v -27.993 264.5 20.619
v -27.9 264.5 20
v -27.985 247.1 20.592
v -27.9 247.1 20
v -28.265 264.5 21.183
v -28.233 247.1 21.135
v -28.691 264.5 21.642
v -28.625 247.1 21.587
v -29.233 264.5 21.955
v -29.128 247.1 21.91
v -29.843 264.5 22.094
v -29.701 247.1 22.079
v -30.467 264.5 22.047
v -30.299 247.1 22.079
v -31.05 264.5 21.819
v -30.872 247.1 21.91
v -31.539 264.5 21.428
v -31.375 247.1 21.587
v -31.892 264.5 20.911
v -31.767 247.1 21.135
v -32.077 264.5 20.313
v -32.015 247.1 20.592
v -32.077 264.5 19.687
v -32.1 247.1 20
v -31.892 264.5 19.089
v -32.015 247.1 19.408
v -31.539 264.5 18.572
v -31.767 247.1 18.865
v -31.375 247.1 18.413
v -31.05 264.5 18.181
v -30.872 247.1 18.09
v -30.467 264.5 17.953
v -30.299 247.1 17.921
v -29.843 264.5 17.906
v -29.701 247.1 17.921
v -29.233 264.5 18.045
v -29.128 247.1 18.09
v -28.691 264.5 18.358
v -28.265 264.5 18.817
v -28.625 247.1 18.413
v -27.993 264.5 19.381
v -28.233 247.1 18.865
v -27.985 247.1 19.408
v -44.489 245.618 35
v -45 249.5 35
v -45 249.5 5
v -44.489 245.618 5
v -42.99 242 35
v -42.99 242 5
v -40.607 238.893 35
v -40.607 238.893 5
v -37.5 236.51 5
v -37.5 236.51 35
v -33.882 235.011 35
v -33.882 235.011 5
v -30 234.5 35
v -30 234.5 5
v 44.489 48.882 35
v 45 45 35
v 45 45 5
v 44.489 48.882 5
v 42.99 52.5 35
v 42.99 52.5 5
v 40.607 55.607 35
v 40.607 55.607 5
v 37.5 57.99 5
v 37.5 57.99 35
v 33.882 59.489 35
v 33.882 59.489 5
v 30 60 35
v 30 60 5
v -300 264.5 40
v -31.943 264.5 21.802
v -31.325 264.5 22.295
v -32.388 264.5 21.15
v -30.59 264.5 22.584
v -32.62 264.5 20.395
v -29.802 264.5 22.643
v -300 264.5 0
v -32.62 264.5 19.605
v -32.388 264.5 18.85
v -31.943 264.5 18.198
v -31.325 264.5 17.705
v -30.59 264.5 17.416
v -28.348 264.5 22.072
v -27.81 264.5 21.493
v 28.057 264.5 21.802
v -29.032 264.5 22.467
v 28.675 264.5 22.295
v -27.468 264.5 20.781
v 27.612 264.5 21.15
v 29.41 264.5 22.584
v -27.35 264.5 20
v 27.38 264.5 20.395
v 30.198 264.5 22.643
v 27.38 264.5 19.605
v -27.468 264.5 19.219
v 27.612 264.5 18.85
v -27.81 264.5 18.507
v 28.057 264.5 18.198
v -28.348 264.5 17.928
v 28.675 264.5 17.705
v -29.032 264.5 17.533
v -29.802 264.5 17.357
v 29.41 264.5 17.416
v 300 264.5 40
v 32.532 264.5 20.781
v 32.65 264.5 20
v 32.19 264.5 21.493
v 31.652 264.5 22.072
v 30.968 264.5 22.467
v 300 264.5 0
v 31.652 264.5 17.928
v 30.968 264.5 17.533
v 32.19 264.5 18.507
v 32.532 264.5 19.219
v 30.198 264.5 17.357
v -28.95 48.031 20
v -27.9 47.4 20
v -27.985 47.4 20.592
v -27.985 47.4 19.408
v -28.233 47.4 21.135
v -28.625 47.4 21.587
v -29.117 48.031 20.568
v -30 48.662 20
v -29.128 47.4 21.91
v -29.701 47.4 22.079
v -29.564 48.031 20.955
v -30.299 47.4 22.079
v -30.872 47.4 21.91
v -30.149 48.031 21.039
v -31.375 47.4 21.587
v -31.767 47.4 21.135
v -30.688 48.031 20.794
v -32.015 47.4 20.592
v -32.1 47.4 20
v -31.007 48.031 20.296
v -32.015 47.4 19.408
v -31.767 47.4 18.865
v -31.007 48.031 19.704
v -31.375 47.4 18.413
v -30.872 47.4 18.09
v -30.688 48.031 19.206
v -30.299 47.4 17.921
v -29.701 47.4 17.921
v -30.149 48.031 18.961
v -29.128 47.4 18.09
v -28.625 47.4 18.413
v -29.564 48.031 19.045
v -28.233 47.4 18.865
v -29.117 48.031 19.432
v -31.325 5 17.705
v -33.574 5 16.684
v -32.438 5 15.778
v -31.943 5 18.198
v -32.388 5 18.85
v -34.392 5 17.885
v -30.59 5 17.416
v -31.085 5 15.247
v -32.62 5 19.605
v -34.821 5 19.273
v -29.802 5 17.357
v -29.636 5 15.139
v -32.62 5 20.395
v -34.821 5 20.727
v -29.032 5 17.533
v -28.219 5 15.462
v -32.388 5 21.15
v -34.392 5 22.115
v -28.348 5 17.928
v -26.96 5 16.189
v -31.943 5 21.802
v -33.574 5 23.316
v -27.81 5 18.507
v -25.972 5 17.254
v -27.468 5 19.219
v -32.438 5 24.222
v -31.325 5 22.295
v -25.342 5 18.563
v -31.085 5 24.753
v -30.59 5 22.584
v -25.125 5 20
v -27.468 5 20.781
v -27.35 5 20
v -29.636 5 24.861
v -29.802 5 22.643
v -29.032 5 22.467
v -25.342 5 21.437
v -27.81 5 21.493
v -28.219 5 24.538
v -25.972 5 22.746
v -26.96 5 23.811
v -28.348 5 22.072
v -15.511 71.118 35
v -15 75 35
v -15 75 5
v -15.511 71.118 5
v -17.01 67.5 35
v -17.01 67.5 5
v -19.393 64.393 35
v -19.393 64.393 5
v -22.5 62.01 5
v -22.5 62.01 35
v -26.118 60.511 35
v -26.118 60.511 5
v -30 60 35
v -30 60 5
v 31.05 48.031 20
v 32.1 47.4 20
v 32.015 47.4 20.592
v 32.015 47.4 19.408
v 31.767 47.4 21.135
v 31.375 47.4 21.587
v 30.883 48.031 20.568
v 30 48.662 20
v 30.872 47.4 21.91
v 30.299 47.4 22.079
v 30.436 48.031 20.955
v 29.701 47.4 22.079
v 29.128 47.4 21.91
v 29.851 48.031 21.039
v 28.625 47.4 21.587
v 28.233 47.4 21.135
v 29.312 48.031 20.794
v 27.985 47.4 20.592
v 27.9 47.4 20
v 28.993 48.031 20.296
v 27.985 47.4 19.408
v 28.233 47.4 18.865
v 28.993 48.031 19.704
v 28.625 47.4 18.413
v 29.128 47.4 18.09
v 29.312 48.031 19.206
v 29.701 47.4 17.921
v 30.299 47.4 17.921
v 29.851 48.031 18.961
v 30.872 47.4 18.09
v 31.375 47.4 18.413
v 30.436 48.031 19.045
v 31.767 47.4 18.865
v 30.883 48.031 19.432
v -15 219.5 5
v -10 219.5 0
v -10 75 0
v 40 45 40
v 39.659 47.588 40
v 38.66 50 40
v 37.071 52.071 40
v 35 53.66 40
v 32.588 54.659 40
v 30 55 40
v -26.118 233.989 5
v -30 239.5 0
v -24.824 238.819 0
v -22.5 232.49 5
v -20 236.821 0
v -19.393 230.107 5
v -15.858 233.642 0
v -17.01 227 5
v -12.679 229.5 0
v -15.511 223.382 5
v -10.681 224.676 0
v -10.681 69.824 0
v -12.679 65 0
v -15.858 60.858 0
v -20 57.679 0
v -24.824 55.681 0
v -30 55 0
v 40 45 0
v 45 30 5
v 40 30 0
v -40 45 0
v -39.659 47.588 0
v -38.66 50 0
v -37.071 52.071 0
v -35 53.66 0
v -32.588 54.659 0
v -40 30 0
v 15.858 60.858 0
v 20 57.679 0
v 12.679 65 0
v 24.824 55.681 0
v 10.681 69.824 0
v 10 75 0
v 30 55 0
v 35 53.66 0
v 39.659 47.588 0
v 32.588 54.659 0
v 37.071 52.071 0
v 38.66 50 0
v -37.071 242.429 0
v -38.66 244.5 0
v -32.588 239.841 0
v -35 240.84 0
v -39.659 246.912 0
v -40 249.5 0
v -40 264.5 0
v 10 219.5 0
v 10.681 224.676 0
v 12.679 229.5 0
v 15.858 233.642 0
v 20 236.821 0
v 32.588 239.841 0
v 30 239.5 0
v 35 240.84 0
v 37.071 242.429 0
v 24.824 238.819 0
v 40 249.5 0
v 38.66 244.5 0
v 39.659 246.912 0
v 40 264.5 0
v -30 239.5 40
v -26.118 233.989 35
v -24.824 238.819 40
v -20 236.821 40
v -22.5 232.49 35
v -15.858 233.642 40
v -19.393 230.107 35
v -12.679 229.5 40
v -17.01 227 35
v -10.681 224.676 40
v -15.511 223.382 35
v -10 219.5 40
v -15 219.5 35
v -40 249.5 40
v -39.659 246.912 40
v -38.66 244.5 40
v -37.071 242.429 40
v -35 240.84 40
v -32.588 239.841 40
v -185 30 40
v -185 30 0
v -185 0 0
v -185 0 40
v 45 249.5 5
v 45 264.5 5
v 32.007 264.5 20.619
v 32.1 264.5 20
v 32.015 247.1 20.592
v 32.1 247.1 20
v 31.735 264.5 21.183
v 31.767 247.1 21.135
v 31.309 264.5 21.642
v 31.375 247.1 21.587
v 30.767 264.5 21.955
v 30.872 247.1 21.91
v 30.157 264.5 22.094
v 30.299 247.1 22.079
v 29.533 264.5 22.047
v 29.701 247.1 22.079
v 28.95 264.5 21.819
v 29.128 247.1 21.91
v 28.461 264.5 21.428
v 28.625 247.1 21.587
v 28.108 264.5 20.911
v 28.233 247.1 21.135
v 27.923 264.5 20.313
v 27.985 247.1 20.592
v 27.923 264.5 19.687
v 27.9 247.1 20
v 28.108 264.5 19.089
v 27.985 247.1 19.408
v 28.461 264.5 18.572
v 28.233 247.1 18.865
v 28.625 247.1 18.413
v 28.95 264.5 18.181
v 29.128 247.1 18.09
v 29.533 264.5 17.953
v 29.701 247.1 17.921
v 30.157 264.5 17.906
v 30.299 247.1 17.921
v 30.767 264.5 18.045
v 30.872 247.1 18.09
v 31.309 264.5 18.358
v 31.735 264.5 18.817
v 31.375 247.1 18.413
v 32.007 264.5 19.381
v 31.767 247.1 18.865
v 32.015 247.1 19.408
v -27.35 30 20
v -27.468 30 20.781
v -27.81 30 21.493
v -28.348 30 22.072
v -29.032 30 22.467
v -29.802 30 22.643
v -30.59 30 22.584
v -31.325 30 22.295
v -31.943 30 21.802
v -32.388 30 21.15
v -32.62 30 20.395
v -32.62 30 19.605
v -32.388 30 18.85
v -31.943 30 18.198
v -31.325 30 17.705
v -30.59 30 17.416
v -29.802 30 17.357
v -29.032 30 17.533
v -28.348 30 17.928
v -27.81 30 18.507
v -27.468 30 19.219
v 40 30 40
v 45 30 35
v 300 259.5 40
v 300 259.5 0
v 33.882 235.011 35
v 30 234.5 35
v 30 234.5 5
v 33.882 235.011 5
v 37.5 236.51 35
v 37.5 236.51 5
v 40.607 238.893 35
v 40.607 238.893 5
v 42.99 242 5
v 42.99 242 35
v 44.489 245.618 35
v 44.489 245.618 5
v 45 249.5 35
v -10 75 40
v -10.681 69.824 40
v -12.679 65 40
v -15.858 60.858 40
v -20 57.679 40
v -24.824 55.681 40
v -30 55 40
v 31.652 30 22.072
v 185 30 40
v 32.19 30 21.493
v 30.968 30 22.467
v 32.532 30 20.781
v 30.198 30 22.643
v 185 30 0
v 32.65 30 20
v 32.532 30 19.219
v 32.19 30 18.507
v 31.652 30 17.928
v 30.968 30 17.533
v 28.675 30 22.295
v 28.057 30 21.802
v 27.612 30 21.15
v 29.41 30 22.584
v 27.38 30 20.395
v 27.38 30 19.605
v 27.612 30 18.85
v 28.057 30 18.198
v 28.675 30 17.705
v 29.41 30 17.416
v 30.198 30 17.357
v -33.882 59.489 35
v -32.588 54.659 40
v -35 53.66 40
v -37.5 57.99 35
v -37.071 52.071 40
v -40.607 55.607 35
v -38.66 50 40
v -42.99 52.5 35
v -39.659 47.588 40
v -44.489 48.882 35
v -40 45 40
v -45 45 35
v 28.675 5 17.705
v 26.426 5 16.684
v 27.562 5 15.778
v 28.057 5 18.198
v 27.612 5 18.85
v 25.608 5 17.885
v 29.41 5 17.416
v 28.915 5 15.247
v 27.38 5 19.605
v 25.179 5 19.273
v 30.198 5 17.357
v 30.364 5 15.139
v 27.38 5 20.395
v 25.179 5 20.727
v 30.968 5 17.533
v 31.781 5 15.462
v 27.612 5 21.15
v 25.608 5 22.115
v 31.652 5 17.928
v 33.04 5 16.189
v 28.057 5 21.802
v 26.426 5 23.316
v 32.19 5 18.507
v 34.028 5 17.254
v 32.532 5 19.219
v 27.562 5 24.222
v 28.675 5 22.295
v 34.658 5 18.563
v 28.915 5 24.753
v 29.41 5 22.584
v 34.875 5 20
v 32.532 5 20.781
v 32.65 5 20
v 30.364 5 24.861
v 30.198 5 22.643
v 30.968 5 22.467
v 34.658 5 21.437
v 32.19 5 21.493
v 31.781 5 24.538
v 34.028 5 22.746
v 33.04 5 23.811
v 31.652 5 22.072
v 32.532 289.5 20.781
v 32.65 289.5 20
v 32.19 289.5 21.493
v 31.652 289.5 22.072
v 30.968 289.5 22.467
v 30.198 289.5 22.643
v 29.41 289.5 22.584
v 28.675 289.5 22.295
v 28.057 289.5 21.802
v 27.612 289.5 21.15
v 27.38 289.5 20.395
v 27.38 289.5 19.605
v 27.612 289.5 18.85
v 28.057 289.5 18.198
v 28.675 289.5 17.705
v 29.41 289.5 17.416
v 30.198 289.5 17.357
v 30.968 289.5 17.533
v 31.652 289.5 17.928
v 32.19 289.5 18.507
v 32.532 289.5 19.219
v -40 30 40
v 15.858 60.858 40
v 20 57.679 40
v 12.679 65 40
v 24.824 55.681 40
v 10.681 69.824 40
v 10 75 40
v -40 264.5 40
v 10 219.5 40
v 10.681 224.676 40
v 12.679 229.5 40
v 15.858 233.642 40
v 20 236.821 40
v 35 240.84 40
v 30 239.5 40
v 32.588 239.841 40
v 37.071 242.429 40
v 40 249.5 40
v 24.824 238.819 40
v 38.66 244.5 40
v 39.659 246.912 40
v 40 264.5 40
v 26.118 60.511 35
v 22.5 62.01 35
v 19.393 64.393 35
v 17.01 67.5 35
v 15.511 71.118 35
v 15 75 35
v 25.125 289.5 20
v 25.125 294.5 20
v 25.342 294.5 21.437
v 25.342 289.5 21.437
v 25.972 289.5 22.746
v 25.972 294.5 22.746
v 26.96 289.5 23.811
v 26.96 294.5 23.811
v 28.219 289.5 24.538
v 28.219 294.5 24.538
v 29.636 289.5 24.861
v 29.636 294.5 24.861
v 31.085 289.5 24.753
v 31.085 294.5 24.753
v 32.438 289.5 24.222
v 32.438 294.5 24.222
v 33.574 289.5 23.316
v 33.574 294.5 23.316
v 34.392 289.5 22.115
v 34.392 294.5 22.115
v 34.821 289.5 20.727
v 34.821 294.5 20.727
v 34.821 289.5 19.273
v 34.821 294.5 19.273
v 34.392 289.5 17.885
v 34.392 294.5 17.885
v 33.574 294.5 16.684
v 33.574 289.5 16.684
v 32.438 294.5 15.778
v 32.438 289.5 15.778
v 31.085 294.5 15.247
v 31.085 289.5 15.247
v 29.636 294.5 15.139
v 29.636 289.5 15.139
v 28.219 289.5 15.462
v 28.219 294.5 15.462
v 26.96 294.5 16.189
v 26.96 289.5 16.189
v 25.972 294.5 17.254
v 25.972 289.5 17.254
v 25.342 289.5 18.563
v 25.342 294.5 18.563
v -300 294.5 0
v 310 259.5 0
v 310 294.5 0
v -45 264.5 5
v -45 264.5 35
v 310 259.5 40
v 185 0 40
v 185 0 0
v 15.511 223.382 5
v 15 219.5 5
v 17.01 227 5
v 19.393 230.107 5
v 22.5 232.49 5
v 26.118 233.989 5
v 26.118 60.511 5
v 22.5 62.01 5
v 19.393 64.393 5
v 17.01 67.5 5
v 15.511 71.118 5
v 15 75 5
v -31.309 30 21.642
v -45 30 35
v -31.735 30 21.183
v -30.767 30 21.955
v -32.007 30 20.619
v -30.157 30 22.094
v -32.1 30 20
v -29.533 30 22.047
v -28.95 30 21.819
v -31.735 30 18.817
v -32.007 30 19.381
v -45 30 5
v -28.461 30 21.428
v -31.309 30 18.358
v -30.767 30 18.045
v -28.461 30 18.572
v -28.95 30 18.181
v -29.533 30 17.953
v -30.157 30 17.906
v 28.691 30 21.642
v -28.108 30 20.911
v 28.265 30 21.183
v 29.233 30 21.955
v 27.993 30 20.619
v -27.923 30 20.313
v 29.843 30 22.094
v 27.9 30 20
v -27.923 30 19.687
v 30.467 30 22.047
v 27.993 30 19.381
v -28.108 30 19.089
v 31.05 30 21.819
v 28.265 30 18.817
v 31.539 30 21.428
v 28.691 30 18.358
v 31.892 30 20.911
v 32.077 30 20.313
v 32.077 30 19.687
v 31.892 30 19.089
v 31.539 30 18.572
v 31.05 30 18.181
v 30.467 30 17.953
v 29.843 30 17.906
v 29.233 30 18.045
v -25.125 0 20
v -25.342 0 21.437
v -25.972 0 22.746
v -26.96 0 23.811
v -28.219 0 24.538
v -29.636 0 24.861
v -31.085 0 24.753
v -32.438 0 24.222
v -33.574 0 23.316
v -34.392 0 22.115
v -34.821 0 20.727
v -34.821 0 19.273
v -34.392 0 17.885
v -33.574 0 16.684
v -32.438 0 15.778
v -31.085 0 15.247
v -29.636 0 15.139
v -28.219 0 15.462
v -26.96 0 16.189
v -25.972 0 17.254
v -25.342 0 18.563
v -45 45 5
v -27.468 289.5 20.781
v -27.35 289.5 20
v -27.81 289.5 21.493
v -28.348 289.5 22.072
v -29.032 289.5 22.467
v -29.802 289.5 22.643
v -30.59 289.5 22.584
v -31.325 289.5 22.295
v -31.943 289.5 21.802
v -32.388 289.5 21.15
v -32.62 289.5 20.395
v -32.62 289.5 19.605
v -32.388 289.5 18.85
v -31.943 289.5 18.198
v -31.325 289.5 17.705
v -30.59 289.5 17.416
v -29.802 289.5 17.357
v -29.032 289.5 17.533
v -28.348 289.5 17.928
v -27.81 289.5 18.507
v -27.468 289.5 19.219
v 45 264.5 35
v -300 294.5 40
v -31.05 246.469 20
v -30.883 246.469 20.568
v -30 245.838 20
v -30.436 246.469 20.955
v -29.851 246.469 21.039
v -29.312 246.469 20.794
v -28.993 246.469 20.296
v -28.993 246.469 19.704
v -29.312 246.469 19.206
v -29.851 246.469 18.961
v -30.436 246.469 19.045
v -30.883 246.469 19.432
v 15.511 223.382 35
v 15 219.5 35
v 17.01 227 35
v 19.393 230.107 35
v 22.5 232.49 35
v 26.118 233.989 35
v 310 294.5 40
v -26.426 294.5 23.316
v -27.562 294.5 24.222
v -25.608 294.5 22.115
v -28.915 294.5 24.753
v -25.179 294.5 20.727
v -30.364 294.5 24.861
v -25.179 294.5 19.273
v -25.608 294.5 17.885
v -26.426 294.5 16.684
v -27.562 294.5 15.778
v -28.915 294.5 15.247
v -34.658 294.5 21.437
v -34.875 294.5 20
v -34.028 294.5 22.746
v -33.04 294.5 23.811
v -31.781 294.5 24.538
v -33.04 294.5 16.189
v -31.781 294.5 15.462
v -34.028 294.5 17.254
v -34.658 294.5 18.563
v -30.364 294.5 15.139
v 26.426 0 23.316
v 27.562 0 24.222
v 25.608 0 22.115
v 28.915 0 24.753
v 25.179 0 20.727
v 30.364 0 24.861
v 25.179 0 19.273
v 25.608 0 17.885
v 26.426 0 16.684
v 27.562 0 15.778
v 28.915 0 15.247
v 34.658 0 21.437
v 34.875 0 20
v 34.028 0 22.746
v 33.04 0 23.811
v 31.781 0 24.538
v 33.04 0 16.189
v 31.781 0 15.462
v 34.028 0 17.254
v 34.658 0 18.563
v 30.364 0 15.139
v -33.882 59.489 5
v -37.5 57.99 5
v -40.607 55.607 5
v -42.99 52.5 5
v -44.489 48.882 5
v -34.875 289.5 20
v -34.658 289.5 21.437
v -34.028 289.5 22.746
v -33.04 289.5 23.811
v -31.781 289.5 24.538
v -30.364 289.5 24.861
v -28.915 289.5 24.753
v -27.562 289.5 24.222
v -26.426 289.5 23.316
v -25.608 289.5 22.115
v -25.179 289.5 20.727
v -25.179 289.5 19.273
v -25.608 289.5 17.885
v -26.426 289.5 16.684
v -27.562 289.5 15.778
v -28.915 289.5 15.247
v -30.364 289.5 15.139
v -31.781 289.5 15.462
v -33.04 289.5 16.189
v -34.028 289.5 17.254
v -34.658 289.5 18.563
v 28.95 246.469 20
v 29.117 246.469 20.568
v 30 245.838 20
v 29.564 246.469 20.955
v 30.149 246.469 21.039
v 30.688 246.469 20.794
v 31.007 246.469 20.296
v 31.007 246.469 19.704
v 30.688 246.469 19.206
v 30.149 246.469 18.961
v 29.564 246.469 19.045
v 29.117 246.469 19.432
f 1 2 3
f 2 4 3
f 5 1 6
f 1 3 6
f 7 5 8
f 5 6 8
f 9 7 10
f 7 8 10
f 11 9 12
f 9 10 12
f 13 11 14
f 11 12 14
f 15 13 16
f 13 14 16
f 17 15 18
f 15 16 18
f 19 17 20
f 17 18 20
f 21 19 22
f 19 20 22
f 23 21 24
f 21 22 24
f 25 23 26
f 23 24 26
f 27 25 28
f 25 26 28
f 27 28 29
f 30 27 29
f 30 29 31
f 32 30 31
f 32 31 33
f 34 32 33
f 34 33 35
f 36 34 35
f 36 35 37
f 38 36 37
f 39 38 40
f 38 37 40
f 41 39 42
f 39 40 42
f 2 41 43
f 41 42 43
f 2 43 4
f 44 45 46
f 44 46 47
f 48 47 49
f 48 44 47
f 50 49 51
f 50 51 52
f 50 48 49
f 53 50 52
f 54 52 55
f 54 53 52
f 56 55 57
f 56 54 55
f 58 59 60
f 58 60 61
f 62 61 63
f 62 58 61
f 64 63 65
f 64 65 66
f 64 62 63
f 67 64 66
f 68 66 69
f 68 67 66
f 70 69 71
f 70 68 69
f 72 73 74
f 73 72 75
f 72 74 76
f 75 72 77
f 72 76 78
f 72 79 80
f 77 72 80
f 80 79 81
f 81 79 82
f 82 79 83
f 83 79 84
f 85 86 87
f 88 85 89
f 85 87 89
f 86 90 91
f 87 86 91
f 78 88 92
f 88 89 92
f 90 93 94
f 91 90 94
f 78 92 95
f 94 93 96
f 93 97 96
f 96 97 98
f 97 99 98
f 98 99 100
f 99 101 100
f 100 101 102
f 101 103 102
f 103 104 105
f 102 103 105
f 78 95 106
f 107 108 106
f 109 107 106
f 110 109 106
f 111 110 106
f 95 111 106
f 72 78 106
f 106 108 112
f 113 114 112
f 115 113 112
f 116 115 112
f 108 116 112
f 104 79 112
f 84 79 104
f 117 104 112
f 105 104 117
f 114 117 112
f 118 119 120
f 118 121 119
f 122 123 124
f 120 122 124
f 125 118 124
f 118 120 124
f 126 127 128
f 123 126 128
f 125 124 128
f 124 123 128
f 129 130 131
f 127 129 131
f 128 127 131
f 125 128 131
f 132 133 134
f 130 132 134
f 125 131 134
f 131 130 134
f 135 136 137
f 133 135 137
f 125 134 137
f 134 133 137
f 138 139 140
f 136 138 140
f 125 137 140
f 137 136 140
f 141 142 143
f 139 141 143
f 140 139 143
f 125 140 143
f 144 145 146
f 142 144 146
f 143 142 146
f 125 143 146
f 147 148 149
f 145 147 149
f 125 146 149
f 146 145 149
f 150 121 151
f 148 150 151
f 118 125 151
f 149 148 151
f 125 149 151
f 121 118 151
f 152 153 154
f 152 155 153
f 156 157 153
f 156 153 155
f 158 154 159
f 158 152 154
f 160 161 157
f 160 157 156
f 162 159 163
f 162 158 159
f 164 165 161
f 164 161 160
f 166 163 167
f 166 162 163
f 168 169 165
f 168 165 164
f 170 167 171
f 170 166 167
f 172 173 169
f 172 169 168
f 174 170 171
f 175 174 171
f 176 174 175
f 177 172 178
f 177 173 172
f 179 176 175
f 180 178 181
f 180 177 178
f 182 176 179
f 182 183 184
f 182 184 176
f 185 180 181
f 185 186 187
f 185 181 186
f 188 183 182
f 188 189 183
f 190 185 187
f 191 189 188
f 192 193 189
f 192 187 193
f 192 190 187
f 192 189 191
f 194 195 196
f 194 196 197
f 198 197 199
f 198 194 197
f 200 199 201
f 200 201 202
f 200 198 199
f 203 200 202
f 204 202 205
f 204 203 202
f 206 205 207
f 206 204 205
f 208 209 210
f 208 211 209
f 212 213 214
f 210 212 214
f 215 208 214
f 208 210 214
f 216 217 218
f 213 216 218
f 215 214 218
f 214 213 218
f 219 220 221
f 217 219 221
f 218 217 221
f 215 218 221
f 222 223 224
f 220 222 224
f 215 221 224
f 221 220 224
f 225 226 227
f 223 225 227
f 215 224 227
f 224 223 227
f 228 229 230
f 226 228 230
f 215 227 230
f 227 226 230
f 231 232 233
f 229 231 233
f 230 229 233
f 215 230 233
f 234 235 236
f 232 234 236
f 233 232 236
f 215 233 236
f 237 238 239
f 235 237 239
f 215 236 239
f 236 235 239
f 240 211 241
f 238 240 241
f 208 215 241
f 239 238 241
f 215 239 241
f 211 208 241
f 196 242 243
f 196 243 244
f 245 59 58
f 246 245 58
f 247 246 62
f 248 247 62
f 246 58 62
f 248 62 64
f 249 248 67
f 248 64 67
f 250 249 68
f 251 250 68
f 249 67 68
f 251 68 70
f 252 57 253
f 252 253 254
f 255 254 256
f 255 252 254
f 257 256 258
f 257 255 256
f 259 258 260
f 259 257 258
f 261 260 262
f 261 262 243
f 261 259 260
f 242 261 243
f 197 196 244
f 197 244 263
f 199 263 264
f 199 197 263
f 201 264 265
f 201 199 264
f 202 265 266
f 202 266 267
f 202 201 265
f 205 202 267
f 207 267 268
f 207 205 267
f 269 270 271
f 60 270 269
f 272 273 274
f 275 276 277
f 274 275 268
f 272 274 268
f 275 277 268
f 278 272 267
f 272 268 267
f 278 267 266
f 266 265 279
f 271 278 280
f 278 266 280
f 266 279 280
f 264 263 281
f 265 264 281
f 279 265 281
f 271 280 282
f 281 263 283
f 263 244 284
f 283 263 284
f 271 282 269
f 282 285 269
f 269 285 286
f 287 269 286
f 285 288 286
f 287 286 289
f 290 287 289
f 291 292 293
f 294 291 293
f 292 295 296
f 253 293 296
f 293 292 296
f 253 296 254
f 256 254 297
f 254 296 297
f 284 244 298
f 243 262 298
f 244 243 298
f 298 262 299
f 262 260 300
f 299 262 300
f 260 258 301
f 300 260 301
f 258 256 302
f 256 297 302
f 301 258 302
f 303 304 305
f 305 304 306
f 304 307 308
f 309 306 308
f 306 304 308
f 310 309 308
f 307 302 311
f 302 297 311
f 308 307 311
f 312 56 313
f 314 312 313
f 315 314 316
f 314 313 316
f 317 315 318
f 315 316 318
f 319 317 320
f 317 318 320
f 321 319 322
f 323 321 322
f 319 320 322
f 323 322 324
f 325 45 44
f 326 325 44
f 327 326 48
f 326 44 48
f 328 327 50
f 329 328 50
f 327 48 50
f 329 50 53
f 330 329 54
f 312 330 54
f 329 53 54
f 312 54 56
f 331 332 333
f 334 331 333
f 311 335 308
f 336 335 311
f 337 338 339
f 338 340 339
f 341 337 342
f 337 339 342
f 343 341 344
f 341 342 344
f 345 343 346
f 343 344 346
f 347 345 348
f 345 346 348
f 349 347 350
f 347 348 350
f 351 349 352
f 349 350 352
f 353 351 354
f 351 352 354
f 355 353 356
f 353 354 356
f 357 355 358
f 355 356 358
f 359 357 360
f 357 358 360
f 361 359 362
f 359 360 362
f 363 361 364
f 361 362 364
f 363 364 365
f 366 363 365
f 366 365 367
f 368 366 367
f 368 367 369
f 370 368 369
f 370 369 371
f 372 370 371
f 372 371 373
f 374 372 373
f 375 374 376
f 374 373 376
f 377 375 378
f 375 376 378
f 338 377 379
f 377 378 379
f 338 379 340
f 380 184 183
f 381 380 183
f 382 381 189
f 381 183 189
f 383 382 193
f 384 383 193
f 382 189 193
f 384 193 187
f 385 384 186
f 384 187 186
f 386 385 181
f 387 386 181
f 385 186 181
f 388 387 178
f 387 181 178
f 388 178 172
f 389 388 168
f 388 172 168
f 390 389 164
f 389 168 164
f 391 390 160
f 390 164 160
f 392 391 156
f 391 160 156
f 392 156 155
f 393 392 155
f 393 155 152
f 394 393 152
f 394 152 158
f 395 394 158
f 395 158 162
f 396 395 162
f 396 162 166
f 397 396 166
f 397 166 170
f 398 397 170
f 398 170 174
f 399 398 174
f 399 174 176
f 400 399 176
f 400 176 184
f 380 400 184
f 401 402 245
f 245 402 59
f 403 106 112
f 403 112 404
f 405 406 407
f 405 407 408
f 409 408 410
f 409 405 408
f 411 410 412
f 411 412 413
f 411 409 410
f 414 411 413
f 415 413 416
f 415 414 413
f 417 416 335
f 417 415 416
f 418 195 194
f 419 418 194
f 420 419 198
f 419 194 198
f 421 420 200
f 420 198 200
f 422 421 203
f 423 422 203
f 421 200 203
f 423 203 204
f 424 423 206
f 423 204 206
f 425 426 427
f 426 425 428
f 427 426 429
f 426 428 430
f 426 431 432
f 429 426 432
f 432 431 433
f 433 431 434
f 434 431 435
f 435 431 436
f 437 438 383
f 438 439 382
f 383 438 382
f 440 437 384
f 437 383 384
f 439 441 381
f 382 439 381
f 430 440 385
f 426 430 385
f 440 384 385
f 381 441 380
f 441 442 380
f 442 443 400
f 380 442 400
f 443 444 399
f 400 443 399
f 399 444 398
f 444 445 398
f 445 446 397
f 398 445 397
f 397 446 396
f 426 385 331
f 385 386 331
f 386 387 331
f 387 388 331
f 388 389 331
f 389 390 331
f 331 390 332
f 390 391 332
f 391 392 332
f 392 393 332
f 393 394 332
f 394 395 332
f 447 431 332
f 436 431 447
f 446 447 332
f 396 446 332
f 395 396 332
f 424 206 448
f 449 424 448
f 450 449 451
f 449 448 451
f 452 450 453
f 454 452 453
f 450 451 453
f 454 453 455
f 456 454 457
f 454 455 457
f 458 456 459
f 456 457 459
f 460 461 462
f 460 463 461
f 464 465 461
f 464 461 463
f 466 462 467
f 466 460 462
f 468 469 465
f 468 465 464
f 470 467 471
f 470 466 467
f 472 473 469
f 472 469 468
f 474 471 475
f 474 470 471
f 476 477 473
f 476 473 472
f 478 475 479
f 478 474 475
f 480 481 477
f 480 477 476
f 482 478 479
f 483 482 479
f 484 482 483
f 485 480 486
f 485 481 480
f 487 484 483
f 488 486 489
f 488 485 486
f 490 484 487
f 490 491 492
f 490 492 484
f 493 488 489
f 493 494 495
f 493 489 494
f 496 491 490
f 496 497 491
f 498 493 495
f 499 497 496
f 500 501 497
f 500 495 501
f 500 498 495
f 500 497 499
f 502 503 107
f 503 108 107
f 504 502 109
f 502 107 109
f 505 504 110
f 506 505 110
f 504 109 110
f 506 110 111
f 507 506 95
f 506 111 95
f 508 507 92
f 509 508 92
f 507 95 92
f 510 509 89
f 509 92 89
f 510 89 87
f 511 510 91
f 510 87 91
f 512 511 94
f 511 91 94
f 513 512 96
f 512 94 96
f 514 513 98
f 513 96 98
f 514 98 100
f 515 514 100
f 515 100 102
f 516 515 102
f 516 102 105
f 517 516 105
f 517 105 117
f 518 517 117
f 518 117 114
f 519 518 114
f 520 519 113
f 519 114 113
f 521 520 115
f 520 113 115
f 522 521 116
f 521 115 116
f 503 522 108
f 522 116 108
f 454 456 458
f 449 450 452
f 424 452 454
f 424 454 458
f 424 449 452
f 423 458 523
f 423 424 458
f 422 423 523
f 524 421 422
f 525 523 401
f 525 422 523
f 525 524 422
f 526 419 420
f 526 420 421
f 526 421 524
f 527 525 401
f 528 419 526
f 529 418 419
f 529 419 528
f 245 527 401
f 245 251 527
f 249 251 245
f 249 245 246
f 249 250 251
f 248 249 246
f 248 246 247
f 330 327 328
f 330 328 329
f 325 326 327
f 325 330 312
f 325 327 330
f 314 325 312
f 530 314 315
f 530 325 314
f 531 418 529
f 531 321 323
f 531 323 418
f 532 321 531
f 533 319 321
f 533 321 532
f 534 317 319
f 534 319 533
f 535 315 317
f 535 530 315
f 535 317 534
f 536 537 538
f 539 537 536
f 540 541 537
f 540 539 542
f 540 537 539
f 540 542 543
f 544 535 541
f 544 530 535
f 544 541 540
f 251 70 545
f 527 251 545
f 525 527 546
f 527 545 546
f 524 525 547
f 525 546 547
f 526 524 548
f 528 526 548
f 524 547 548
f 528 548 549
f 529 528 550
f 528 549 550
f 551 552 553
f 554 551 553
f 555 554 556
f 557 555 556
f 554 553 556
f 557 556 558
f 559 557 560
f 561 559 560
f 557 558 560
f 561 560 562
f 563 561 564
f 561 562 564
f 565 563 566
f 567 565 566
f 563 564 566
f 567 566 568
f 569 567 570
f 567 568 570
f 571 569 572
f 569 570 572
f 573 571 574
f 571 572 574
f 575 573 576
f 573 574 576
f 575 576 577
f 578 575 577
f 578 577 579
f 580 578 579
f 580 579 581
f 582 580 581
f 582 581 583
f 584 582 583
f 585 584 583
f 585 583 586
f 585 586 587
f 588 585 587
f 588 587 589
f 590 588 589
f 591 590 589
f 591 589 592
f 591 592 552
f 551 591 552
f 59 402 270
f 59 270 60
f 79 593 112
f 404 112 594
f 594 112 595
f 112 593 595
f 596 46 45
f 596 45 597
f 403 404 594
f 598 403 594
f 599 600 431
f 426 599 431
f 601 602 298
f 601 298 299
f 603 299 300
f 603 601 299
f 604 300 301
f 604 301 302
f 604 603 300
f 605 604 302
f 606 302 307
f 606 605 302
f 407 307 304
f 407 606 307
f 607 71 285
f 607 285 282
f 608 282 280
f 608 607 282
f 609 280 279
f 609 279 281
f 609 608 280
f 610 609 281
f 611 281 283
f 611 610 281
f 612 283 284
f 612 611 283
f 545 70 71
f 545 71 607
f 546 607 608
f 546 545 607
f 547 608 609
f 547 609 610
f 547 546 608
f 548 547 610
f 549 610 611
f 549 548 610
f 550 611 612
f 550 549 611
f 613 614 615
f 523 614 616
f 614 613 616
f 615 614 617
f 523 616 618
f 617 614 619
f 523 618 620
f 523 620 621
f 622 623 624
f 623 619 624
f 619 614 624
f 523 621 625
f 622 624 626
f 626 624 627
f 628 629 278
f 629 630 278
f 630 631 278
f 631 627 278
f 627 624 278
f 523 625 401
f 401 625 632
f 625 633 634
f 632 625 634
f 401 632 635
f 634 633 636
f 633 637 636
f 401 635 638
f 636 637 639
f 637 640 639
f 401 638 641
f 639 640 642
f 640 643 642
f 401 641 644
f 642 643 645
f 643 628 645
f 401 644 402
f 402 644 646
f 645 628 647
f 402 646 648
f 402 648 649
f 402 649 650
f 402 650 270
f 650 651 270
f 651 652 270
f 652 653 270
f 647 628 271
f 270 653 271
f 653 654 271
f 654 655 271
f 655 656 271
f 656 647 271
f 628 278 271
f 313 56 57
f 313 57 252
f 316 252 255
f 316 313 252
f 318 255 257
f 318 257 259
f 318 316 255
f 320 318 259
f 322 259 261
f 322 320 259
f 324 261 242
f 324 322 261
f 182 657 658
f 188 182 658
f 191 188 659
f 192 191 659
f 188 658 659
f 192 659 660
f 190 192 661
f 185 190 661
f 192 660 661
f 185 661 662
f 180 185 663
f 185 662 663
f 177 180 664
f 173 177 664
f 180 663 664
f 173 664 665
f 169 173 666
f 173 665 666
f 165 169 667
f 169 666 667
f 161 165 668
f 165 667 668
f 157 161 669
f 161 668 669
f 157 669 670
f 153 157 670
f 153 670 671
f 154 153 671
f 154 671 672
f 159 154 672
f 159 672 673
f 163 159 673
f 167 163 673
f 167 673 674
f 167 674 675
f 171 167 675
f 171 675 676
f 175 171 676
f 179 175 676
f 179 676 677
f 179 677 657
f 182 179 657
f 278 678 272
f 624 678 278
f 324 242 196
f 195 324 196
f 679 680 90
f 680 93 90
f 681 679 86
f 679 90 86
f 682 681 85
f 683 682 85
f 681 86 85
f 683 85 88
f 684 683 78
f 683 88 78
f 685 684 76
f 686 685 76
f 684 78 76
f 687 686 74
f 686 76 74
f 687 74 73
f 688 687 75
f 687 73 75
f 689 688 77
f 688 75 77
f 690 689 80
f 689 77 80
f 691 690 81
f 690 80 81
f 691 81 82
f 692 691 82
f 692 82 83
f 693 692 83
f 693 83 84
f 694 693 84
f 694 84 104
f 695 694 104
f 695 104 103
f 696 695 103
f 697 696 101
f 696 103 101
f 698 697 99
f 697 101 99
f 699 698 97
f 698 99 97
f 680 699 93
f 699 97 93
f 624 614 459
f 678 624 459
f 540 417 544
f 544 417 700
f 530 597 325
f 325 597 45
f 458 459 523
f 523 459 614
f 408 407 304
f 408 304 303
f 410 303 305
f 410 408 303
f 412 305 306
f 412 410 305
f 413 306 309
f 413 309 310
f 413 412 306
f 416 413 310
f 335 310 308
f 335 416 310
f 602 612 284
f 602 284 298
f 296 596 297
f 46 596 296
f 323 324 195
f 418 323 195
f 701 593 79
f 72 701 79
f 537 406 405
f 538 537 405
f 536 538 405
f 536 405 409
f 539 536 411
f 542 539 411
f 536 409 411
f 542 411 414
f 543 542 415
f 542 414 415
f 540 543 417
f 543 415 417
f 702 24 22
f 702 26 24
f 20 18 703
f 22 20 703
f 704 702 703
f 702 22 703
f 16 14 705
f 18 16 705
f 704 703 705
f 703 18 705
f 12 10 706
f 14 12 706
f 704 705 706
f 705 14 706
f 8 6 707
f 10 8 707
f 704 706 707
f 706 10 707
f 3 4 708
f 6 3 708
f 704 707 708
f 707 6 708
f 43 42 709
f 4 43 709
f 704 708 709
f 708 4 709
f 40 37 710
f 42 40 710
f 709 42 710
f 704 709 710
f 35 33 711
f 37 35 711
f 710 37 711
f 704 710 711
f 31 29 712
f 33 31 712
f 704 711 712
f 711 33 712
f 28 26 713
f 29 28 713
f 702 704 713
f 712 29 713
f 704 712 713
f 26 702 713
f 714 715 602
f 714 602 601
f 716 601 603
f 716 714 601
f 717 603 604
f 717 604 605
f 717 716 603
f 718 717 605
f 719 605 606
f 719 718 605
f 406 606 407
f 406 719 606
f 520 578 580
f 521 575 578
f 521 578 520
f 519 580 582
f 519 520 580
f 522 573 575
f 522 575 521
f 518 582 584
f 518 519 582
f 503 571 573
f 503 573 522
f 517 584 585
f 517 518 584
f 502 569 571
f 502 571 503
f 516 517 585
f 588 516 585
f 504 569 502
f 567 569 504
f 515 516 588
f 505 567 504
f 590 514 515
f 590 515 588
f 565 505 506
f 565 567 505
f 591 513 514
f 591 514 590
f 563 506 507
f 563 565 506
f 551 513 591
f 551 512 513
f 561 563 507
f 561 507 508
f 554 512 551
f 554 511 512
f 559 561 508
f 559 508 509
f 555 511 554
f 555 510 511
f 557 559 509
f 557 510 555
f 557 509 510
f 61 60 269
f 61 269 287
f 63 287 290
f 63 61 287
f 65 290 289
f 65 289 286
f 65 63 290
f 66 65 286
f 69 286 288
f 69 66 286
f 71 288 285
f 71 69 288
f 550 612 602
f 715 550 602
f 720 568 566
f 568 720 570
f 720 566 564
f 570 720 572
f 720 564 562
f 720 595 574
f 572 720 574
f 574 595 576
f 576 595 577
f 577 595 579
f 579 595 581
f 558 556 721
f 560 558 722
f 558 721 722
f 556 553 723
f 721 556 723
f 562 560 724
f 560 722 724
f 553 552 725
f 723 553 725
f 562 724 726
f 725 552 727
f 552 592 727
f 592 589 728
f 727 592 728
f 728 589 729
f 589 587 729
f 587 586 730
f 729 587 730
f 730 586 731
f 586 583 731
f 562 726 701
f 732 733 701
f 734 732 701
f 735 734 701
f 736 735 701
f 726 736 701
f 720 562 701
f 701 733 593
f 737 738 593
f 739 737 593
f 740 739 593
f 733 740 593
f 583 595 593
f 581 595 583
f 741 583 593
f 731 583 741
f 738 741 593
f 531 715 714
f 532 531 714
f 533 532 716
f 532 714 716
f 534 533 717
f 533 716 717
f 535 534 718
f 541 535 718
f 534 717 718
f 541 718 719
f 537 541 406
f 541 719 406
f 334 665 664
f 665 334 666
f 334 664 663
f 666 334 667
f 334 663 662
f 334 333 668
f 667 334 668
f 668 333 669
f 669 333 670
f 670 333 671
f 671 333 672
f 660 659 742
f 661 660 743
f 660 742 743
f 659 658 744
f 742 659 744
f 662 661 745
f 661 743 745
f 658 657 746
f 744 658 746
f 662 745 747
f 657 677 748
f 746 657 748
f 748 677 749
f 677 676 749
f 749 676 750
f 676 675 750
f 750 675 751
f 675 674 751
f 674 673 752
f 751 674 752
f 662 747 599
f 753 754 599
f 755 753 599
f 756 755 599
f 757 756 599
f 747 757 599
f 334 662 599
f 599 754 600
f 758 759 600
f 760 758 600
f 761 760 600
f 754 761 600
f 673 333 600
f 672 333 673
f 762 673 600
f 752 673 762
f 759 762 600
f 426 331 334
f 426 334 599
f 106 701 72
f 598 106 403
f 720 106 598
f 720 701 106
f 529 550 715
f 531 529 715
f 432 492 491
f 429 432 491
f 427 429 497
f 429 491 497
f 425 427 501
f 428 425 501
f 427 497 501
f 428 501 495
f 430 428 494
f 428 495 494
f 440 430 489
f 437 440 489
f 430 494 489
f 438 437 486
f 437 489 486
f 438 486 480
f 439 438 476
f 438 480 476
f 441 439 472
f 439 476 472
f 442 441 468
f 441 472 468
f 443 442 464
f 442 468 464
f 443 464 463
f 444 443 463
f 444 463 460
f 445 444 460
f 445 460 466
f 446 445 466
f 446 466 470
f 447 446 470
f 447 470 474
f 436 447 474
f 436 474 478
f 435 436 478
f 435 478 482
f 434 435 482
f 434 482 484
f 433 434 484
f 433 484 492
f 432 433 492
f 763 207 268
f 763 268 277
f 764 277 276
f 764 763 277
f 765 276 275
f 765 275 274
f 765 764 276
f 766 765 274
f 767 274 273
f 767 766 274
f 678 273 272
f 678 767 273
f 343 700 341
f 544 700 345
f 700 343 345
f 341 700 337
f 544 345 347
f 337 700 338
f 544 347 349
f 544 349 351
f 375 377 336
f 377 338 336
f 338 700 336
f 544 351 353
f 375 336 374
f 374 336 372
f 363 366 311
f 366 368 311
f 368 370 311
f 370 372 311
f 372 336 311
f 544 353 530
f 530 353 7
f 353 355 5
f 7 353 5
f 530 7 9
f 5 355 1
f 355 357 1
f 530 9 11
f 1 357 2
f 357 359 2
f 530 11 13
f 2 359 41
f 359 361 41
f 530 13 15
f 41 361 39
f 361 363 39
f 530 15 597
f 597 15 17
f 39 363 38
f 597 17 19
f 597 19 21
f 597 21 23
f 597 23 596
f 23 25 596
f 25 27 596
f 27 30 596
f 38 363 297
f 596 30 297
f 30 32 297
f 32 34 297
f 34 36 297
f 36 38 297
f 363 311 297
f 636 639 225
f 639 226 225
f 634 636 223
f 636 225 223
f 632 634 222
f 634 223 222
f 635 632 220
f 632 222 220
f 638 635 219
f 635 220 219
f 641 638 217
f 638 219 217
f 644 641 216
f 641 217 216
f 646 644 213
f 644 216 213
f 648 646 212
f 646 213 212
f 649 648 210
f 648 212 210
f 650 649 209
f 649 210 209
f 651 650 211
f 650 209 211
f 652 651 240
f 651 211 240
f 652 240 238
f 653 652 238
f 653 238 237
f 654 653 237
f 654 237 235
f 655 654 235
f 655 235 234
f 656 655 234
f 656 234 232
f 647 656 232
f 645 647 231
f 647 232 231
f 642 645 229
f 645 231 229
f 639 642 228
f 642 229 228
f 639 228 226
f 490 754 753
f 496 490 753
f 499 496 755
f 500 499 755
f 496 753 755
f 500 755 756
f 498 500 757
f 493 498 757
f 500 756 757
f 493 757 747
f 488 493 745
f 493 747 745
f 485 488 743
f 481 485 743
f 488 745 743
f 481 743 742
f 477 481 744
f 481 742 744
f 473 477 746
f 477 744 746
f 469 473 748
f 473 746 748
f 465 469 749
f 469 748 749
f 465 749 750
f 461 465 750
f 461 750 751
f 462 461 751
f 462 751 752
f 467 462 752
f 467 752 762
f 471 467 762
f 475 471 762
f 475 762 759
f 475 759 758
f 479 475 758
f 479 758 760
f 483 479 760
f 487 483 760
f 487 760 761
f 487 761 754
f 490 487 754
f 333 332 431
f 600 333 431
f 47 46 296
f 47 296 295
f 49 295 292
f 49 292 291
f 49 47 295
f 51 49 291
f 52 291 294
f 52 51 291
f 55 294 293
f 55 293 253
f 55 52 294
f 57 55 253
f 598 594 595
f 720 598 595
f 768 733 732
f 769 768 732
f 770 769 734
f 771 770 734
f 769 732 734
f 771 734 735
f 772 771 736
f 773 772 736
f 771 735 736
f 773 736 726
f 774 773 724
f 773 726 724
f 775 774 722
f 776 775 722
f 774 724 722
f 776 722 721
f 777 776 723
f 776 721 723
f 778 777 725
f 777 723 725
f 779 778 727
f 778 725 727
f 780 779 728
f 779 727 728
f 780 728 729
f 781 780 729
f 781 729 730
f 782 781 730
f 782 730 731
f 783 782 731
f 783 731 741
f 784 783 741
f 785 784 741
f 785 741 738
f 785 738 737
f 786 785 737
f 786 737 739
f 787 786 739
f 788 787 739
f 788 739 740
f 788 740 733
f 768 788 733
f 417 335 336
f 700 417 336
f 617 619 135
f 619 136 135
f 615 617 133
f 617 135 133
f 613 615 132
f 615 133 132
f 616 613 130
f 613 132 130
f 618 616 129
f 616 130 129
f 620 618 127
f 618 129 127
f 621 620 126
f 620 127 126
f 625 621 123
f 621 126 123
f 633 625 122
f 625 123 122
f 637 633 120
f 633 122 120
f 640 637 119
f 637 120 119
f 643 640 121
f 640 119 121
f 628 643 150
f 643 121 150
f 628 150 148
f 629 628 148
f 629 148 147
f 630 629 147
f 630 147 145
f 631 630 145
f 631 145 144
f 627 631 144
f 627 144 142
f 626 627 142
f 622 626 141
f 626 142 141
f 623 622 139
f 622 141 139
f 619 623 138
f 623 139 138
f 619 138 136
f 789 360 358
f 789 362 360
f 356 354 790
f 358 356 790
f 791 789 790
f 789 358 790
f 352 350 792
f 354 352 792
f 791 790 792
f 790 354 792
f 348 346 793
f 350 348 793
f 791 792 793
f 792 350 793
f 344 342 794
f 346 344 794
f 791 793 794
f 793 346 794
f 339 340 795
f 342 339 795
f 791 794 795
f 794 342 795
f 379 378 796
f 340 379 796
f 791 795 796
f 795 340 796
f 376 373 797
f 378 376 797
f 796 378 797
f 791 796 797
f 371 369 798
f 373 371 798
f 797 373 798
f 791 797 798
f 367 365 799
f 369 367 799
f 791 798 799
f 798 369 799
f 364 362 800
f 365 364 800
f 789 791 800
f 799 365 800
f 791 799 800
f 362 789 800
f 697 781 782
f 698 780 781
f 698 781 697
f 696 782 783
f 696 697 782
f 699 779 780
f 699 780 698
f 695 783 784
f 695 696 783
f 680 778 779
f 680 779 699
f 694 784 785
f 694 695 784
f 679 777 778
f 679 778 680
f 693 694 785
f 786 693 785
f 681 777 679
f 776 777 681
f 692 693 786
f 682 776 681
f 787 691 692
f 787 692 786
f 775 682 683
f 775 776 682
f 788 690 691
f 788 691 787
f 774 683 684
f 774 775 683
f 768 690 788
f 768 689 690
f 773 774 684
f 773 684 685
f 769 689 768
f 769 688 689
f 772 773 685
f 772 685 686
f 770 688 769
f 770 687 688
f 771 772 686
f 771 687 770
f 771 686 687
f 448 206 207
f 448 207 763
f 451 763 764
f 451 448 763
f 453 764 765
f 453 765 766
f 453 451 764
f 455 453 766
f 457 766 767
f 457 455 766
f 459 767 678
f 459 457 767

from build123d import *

# Parameters (mm, degrees)
F1_DEPTH             = 40
F0_W                 = 30
F0_H                 = 30
F2_DEPTH             = 40
F3_DEPTH             = 40
F4_R                 = 14.99999
F5_SIZE              = 5
F8_D                 = 5.3
F8_CBORE_D           = 9.75
F8_CBORE_DEPTH       = 5
F8_2_D               = 5.3
F8_2_CBORE_D         = 9.75
F8_2_CBORE_DEPTH     = 5
F8_ON_F7_D           = 5.3
F8_ON_F7_CBORE_D     = 9.75
F8_ON_F7_CBORE_DEPTH = 5
F9_D                 = 4.2
F9_DEPTH             = 17.4
F9_START             = 30
F9_TIP               = 1.2618073
F9_ON_F7_D           = 4.2
F9_ON_F7_DEPTH       = 17.4
F9_ON_F7_START       = 30
F9_ON_F7_TIP         = 1.2618073


# Not quite as in the source:
# - a fillet or chamfer is up to 0.001 mm smaller than in the source, because OpenCascade refuses the exact size


with BuildPart() as f1:
    # F0 (on Top) → F1 (new body)
    with BuildSketch(Plane.XY):
        Polygon((300, 294.5), (-300, 294.5), (-300, 264.5), (-45, 264.5), (-15, 264.5), (15, 264.5), (45, 264.5), (300, 264.5), align=None)
        Polygon((310, 294.5), (300, 294.5), (300, 264.5), (300, 259.5), (310, 259.5), align=None)
    extrude(amount=F1_DEPTH)

    # F8 (through all)
    with Locations(Plane(origin=(0, 294.5, 0), x_dir=(-1, 0, 0), z_dir=(0, 1, 0))):
        with Locations((-30, 20), (30, 20)):
            CounterBoreHole(F8_D / 2, F8_CBORE_D / 2, F8_CBORE_DEPTH)


with BuildPart() as f2:
    # F0 (on Top) → F2 (new body)
    with BuildSketch(Plane.XY):
        Polygon((15, 264.5), (-15, 264.5), (-15, 234.5), (-15, 60), (-15, 30), (15, 30), (15, 60), (15, 234.5), align=None)
        with Locations((-30, 249.5)):
            Rectangle(F0_W, F0_H)
        with Locations((30, 249.5)):
            Rectangle(F0_W, F0_H)
        with Locations((-30, 45)):
            Rectangle(F0_W, F0_H)
        with Locations((30, 45)):
            Rectangle(F0_W, F0_H)
    extrude(amount=F2_DEPTH)

    # F4 (radius 15 in the source; OpenCascade refuses exactly that, so slightly less here)
    f4_edges = [f2.edges().sort_by_distance(p)[0] for p in [
        (45, 234.5, 20),
        (-45, 234.5, 20),
        (-45, 60, 20),
        (45, 60, 20),
        (15, 234.5, 20),
        (-15, 234.5, 20),
        (-15, 60, 20),
        (15, 60, 20),
    ]]
    fillet(f4_edges, radius=F4_R)

    # F5
    f5_edges = [f2.edges().sort_by_distance(p)[0] for p in [
        (-15, 147.25, 40),
        (15, 147.25, 40),
        (-15, 147.25, 0),
        (15, 147.25, 0),
    ]]
    chamfer(f5_edges, length=F5_SIZE)

    # F9
    # its depths count from where the whole tool has entered the part; down to there all is cleared
    with Locations(Plane(origin=(0, 294.5, 0), x_dir=(-1, 0, 0), z_dir=(0, 1, 0))):
        with Locations((30, 20), (-30, 20)):
            Hole(F9_D / 2, depth=F9_START)
    with Locations(Plane(origin=(0, 294.5, 0), x_dir=(-1, 0, 0), z_dir=(0, 1, 0)).offset(-F9_START)):
        with Locations((30, 20), (-30, 20)):
            Hole(F9_D / 2, depth=F9_DEPTH)
            with Locations((0, 0, -(F9_DEPTH + F9_TIP / 2))):  # 118° drill point
                Cone(0, F9_D / 2, F9_TIP, mode=Mode.SUBTRACT)

    # F9 on F7
    # its depths count from where the whole tool has entered the part; down to there all is cleared
    with Locations(Plane.XZ):
        with Locations((-30, 20), (30, 20)):
            Hole(F9_ON_F7_D / 2, depth=F9_ON_F7_START)
    with Locations(Plane.XZ.offset(-F9_ON_F7_START)):
        with Locations((-30, 20), (30, 20)):
            Hole(F9_ON_F7_D / 2, depth=F9_ON_F7_DEPTH)
            with Locations((0, 0, -(F9_ON_F7_DEPTH + F9_ON_F7_TIP / 2))):  # 118° drill point
                Cone(0, F9_ON_F7_D / 2, F9_ON_F7_TIP, mode=Mode.SUBTRACT)


with BuildPart() as f3:
    # F0 (on Top) → F3 (new body)
    with BuildSketch(Plane.XY):
        Polygon((15, 30), (-15, 30), (-45, 30), (-185, 30), (-185, 0), (185, 0), (185, 30), (45, 30), align=None)
    extrude(amount=F3_DEPTH)

    # F8#2 (through all)
    with Locations(Plane(origin=(0, 294.5, 0), x_dir=(-1, 0, 0), z_dir=(0, 1, 0))):
        with Locations((-30, 20), (30, 20)):
            CounterBoreHole(F8_2_D / 2, F8_2_CBORE_D / 2, F8_2_CBORE_DEPTH)

    # F8 on F7 (through all)
    with Locations(Plane.XZ):
        with Locations((-30, 20), (30, 20)):
            CounterBoreHole(F8_ON_F7_D / 2, F8_ON_F7_CBORE_D / 2, F8_ON_F7_CBORE_DEPTH)


solid = Compound([f1.part, f2.part, f3.part])
